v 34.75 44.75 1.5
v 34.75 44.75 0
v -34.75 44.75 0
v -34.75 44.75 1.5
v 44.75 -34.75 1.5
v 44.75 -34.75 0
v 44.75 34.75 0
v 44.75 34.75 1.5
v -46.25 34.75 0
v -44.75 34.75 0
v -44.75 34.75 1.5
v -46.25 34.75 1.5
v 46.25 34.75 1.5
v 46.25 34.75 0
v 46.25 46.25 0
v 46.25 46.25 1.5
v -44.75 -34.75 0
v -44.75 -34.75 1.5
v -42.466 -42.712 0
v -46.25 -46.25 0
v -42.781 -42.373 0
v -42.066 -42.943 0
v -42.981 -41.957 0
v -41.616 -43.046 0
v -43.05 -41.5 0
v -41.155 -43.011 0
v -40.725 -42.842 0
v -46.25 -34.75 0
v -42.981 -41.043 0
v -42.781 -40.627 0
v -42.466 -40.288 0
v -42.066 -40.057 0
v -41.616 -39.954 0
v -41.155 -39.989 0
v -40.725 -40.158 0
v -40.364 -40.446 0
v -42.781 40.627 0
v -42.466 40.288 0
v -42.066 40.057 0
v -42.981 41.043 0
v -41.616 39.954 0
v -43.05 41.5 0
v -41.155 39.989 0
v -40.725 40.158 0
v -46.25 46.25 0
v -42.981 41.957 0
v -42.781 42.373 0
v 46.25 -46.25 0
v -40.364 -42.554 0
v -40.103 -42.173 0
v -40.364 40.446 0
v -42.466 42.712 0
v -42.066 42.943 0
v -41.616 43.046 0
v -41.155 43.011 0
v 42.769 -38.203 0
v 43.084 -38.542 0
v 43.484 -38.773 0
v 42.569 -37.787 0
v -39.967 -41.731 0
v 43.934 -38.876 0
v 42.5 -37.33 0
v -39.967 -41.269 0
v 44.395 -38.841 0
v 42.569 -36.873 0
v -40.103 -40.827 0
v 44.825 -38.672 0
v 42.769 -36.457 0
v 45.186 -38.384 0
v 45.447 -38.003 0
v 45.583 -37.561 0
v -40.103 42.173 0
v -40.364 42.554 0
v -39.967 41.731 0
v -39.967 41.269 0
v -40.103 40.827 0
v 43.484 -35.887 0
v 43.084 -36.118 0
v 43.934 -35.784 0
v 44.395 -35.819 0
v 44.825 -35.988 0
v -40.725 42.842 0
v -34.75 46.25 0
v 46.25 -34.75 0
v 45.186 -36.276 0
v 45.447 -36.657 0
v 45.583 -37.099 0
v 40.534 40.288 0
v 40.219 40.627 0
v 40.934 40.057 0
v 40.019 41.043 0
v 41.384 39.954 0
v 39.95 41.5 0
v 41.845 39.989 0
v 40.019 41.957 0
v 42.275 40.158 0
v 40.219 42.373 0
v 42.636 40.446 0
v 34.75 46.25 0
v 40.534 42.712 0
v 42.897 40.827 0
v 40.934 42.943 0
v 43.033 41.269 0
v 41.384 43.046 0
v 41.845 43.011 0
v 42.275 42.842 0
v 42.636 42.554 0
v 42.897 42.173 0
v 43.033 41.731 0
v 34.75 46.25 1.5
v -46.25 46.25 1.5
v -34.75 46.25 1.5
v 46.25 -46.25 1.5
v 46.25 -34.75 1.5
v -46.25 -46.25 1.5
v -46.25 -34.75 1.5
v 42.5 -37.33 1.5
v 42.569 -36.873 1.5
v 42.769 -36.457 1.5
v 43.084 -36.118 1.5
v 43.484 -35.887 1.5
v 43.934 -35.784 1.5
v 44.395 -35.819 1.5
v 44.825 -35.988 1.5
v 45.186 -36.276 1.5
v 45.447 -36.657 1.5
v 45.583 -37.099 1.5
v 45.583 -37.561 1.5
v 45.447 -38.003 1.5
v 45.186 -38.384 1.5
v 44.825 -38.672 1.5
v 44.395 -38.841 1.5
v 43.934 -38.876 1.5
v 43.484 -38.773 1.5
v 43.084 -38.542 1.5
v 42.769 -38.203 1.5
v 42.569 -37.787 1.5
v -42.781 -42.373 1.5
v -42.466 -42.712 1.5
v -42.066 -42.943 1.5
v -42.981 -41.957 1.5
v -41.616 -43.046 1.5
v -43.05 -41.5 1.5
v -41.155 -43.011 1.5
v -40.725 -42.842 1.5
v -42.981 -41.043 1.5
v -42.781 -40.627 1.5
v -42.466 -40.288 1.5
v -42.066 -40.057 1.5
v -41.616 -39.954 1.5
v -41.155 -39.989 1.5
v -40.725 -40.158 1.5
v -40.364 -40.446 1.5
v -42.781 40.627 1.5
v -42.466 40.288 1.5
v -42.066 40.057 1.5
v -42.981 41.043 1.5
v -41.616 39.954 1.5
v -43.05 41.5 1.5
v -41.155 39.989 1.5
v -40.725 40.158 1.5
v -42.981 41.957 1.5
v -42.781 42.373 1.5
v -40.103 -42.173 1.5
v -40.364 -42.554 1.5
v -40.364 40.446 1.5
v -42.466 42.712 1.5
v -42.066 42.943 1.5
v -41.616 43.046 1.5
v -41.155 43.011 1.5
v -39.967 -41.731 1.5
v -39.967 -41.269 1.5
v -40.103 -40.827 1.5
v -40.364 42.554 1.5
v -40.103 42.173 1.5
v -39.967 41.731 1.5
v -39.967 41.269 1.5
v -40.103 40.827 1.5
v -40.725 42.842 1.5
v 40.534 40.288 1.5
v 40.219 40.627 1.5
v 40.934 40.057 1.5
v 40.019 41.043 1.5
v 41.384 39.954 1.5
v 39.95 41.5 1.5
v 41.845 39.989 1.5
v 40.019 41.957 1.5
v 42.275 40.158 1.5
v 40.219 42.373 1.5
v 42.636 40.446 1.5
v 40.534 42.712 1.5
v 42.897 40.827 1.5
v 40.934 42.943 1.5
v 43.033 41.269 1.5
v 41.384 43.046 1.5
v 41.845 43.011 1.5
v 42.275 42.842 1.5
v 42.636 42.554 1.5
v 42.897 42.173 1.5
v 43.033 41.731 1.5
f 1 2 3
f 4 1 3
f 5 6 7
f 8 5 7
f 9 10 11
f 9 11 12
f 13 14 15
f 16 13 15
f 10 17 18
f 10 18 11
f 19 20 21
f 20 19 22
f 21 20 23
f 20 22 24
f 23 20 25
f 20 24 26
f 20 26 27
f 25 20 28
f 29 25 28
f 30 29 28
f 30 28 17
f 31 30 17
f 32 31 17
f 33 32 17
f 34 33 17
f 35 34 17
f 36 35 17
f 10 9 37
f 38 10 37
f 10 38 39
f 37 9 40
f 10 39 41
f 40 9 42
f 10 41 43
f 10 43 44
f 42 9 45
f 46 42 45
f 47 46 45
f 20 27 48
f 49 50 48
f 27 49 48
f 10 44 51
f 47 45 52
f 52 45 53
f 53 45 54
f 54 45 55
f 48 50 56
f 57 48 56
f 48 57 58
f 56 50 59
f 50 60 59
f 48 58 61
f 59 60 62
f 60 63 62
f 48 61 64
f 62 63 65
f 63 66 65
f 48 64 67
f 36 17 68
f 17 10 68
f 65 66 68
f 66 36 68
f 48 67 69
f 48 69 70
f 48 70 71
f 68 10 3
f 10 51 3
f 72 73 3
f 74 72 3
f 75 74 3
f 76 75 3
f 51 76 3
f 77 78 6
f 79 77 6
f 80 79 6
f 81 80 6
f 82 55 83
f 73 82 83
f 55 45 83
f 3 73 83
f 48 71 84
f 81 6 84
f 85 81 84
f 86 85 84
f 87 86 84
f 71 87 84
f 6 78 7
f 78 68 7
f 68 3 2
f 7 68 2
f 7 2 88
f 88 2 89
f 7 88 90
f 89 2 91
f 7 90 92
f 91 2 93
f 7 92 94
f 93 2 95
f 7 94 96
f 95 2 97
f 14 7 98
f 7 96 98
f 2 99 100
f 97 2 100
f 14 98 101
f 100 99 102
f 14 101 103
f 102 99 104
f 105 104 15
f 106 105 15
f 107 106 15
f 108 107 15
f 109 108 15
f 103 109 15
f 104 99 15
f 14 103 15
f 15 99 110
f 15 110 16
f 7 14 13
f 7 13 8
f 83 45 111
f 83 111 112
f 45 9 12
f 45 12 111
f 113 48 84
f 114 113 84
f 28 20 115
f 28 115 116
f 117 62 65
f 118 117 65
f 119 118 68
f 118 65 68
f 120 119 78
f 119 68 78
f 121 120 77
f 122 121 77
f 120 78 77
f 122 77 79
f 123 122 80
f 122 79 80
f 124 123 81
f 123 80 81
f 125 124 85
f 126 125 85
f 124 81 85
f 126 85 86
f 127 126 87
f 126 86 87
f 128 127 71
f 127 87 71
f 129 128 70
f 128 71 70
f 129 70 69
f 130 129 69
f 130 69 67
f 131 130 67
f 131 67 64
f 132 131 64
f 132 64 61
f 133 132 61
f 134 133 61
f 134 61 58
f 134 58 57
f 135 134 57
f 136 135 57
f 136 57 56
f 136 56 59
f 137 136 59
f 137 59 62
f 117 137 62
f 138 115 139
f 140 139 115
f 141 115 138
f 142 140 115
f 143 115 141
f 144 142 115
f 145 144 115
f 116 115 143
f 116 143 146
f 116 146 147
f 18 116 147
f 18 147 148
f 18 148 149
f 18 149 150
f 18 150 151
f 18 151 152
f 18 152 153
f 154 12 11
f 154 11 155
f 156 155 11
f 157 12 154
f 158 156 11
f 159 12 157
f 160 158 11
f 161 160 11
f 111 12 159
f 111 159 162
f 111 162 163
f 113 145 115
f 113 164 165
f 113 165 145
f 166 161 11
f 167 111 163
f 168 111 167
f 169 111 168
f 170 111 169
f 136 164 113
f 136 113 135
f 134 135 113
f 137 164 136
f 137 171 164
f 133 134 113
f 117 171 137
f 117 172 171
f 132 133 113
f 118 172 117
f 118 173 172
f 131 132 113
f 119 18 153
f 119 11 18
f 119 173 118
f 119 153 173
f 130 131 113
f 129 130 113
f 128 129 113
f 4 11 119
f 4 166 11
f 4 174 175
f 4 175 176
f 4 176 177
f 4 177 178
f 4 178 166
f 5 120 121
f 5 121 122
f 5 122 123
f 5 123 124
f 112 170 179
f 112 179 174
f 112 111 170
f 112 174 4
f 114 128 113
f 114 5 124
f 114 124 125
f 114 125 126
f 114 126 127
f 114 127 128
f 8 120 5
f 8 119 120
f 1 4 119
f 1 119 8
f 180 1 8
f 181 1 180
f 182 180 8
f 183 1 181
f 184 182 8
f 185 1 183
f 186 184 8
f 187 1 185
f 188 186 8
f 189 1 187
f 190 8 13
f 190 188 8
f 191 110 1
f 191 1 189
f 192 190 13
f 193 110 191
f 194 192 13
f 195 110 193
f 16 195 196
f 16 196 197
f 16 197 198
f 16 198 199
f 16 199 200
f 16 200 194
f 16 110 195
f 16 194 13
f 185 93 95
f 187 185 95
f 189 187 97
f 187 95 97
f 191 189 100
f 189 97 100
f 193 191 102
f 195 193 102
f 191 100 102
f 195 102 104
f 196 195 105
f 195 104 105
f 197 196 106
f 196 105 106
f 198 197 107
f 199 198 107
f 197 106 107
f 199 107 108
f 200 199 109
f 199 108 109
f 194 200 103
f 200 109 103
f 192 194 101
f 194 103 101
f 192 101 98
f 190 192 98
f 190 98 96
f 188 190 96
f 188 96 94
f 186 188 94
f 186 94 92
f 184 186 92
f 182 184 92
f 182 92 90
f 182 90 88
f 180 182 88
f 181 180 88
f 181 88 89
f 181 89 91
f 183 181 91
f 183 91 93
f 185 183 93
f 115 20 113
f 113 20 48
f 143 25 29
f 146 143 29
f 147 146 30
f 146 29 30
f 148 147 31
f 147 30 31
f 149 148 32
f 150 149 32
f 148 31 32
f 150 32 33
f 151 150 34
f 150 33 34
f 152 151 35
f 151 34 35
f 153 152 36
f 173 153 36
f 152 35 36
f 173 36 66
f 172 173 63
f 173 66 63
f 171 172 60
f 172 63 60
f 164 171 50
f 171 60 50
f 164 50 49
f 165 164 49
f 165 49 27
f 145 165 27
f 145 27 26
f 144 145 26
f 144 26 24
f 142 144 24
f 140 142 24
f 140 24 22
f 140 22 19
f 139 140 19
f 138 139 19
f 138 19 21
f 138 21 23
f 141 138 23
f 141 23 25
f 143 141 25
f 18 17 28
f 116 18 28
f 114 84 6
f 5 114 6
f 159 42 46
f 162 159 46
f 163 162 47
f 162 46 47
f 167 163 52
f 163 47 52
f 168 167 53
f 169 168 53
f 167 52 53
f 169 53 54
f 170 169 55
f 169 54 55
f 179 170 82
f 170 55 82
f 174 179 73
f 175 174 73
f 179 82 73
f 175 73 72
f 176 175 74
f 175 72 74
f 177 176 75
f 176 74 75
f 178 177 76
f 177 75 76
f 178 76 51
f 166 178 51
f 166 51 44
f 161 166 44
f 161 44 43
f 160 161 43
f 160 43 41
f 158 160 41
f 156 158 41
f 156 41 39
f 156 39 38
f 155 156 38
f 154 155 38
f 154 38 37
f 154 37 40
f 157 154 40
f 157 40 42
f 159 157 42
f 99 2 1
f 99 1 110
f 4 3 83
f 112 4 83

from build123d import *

# Parameters (mm, degrees)
SKETCH1_W                  = 92.5
SKETCH1_H                  = 92.5
BOSS_EXTRUDE1_DEPTH        = 1.5
F_3_1_3_1_DIAMETER_HOLE1_D = 3.1
SKETCH4_W                  = 1.5
SKETCH4_H                  = 69.5
SKETCH4_W_2                = 69.5
SKETCH4_H_2                = 1.5
CUT_EXTRUDE1_DEPTH         = 10


with BuildPart() as part:
    # Sketch1 → Boss-Extrude1 (new body)
    with BuildSketch(Plane.XY):
        Rectangle(SKETCH1_W, SKETCH1_H)
    extrude(amount=BOSS_EXTRUDE1_DEPTH)

    # Ø3.1 (3.1) Diameter Hole1 (through all)
    with Locations(Plane.XY.offset(1.5)):
        with Locations((-41.5, 41.5), (41.5, 41.5), (44.05, -37.33), (-41.5, -41.5)):
            Hole(F_3_1_3_1_DIAMETER_HOLE1_D / 2)

    # Sketch4 → Cut-Extrude1 (cut)
    with BuildSketch(Plane(origin=(0, 0, 0), x_dir=(-1, 0, 0), z_dir=(0, 0, -1))):
        with Locations((-45.5, 0)):
            Rectangle(SKETCH4_W, SKETCH4_H)
        with Locations((45.5, 0)):
            Rectangle(SKETCH4_W, SKETCH4_H)
        with Locations((0, 45.5)):
            Rectangle(SKETCH4_W_2, SKETCH4_H_2)
    extrude(amount=-CUT_EXTRUDE1_DEPTH, mode=Mode.SUBTRACT)


solid = part.part
